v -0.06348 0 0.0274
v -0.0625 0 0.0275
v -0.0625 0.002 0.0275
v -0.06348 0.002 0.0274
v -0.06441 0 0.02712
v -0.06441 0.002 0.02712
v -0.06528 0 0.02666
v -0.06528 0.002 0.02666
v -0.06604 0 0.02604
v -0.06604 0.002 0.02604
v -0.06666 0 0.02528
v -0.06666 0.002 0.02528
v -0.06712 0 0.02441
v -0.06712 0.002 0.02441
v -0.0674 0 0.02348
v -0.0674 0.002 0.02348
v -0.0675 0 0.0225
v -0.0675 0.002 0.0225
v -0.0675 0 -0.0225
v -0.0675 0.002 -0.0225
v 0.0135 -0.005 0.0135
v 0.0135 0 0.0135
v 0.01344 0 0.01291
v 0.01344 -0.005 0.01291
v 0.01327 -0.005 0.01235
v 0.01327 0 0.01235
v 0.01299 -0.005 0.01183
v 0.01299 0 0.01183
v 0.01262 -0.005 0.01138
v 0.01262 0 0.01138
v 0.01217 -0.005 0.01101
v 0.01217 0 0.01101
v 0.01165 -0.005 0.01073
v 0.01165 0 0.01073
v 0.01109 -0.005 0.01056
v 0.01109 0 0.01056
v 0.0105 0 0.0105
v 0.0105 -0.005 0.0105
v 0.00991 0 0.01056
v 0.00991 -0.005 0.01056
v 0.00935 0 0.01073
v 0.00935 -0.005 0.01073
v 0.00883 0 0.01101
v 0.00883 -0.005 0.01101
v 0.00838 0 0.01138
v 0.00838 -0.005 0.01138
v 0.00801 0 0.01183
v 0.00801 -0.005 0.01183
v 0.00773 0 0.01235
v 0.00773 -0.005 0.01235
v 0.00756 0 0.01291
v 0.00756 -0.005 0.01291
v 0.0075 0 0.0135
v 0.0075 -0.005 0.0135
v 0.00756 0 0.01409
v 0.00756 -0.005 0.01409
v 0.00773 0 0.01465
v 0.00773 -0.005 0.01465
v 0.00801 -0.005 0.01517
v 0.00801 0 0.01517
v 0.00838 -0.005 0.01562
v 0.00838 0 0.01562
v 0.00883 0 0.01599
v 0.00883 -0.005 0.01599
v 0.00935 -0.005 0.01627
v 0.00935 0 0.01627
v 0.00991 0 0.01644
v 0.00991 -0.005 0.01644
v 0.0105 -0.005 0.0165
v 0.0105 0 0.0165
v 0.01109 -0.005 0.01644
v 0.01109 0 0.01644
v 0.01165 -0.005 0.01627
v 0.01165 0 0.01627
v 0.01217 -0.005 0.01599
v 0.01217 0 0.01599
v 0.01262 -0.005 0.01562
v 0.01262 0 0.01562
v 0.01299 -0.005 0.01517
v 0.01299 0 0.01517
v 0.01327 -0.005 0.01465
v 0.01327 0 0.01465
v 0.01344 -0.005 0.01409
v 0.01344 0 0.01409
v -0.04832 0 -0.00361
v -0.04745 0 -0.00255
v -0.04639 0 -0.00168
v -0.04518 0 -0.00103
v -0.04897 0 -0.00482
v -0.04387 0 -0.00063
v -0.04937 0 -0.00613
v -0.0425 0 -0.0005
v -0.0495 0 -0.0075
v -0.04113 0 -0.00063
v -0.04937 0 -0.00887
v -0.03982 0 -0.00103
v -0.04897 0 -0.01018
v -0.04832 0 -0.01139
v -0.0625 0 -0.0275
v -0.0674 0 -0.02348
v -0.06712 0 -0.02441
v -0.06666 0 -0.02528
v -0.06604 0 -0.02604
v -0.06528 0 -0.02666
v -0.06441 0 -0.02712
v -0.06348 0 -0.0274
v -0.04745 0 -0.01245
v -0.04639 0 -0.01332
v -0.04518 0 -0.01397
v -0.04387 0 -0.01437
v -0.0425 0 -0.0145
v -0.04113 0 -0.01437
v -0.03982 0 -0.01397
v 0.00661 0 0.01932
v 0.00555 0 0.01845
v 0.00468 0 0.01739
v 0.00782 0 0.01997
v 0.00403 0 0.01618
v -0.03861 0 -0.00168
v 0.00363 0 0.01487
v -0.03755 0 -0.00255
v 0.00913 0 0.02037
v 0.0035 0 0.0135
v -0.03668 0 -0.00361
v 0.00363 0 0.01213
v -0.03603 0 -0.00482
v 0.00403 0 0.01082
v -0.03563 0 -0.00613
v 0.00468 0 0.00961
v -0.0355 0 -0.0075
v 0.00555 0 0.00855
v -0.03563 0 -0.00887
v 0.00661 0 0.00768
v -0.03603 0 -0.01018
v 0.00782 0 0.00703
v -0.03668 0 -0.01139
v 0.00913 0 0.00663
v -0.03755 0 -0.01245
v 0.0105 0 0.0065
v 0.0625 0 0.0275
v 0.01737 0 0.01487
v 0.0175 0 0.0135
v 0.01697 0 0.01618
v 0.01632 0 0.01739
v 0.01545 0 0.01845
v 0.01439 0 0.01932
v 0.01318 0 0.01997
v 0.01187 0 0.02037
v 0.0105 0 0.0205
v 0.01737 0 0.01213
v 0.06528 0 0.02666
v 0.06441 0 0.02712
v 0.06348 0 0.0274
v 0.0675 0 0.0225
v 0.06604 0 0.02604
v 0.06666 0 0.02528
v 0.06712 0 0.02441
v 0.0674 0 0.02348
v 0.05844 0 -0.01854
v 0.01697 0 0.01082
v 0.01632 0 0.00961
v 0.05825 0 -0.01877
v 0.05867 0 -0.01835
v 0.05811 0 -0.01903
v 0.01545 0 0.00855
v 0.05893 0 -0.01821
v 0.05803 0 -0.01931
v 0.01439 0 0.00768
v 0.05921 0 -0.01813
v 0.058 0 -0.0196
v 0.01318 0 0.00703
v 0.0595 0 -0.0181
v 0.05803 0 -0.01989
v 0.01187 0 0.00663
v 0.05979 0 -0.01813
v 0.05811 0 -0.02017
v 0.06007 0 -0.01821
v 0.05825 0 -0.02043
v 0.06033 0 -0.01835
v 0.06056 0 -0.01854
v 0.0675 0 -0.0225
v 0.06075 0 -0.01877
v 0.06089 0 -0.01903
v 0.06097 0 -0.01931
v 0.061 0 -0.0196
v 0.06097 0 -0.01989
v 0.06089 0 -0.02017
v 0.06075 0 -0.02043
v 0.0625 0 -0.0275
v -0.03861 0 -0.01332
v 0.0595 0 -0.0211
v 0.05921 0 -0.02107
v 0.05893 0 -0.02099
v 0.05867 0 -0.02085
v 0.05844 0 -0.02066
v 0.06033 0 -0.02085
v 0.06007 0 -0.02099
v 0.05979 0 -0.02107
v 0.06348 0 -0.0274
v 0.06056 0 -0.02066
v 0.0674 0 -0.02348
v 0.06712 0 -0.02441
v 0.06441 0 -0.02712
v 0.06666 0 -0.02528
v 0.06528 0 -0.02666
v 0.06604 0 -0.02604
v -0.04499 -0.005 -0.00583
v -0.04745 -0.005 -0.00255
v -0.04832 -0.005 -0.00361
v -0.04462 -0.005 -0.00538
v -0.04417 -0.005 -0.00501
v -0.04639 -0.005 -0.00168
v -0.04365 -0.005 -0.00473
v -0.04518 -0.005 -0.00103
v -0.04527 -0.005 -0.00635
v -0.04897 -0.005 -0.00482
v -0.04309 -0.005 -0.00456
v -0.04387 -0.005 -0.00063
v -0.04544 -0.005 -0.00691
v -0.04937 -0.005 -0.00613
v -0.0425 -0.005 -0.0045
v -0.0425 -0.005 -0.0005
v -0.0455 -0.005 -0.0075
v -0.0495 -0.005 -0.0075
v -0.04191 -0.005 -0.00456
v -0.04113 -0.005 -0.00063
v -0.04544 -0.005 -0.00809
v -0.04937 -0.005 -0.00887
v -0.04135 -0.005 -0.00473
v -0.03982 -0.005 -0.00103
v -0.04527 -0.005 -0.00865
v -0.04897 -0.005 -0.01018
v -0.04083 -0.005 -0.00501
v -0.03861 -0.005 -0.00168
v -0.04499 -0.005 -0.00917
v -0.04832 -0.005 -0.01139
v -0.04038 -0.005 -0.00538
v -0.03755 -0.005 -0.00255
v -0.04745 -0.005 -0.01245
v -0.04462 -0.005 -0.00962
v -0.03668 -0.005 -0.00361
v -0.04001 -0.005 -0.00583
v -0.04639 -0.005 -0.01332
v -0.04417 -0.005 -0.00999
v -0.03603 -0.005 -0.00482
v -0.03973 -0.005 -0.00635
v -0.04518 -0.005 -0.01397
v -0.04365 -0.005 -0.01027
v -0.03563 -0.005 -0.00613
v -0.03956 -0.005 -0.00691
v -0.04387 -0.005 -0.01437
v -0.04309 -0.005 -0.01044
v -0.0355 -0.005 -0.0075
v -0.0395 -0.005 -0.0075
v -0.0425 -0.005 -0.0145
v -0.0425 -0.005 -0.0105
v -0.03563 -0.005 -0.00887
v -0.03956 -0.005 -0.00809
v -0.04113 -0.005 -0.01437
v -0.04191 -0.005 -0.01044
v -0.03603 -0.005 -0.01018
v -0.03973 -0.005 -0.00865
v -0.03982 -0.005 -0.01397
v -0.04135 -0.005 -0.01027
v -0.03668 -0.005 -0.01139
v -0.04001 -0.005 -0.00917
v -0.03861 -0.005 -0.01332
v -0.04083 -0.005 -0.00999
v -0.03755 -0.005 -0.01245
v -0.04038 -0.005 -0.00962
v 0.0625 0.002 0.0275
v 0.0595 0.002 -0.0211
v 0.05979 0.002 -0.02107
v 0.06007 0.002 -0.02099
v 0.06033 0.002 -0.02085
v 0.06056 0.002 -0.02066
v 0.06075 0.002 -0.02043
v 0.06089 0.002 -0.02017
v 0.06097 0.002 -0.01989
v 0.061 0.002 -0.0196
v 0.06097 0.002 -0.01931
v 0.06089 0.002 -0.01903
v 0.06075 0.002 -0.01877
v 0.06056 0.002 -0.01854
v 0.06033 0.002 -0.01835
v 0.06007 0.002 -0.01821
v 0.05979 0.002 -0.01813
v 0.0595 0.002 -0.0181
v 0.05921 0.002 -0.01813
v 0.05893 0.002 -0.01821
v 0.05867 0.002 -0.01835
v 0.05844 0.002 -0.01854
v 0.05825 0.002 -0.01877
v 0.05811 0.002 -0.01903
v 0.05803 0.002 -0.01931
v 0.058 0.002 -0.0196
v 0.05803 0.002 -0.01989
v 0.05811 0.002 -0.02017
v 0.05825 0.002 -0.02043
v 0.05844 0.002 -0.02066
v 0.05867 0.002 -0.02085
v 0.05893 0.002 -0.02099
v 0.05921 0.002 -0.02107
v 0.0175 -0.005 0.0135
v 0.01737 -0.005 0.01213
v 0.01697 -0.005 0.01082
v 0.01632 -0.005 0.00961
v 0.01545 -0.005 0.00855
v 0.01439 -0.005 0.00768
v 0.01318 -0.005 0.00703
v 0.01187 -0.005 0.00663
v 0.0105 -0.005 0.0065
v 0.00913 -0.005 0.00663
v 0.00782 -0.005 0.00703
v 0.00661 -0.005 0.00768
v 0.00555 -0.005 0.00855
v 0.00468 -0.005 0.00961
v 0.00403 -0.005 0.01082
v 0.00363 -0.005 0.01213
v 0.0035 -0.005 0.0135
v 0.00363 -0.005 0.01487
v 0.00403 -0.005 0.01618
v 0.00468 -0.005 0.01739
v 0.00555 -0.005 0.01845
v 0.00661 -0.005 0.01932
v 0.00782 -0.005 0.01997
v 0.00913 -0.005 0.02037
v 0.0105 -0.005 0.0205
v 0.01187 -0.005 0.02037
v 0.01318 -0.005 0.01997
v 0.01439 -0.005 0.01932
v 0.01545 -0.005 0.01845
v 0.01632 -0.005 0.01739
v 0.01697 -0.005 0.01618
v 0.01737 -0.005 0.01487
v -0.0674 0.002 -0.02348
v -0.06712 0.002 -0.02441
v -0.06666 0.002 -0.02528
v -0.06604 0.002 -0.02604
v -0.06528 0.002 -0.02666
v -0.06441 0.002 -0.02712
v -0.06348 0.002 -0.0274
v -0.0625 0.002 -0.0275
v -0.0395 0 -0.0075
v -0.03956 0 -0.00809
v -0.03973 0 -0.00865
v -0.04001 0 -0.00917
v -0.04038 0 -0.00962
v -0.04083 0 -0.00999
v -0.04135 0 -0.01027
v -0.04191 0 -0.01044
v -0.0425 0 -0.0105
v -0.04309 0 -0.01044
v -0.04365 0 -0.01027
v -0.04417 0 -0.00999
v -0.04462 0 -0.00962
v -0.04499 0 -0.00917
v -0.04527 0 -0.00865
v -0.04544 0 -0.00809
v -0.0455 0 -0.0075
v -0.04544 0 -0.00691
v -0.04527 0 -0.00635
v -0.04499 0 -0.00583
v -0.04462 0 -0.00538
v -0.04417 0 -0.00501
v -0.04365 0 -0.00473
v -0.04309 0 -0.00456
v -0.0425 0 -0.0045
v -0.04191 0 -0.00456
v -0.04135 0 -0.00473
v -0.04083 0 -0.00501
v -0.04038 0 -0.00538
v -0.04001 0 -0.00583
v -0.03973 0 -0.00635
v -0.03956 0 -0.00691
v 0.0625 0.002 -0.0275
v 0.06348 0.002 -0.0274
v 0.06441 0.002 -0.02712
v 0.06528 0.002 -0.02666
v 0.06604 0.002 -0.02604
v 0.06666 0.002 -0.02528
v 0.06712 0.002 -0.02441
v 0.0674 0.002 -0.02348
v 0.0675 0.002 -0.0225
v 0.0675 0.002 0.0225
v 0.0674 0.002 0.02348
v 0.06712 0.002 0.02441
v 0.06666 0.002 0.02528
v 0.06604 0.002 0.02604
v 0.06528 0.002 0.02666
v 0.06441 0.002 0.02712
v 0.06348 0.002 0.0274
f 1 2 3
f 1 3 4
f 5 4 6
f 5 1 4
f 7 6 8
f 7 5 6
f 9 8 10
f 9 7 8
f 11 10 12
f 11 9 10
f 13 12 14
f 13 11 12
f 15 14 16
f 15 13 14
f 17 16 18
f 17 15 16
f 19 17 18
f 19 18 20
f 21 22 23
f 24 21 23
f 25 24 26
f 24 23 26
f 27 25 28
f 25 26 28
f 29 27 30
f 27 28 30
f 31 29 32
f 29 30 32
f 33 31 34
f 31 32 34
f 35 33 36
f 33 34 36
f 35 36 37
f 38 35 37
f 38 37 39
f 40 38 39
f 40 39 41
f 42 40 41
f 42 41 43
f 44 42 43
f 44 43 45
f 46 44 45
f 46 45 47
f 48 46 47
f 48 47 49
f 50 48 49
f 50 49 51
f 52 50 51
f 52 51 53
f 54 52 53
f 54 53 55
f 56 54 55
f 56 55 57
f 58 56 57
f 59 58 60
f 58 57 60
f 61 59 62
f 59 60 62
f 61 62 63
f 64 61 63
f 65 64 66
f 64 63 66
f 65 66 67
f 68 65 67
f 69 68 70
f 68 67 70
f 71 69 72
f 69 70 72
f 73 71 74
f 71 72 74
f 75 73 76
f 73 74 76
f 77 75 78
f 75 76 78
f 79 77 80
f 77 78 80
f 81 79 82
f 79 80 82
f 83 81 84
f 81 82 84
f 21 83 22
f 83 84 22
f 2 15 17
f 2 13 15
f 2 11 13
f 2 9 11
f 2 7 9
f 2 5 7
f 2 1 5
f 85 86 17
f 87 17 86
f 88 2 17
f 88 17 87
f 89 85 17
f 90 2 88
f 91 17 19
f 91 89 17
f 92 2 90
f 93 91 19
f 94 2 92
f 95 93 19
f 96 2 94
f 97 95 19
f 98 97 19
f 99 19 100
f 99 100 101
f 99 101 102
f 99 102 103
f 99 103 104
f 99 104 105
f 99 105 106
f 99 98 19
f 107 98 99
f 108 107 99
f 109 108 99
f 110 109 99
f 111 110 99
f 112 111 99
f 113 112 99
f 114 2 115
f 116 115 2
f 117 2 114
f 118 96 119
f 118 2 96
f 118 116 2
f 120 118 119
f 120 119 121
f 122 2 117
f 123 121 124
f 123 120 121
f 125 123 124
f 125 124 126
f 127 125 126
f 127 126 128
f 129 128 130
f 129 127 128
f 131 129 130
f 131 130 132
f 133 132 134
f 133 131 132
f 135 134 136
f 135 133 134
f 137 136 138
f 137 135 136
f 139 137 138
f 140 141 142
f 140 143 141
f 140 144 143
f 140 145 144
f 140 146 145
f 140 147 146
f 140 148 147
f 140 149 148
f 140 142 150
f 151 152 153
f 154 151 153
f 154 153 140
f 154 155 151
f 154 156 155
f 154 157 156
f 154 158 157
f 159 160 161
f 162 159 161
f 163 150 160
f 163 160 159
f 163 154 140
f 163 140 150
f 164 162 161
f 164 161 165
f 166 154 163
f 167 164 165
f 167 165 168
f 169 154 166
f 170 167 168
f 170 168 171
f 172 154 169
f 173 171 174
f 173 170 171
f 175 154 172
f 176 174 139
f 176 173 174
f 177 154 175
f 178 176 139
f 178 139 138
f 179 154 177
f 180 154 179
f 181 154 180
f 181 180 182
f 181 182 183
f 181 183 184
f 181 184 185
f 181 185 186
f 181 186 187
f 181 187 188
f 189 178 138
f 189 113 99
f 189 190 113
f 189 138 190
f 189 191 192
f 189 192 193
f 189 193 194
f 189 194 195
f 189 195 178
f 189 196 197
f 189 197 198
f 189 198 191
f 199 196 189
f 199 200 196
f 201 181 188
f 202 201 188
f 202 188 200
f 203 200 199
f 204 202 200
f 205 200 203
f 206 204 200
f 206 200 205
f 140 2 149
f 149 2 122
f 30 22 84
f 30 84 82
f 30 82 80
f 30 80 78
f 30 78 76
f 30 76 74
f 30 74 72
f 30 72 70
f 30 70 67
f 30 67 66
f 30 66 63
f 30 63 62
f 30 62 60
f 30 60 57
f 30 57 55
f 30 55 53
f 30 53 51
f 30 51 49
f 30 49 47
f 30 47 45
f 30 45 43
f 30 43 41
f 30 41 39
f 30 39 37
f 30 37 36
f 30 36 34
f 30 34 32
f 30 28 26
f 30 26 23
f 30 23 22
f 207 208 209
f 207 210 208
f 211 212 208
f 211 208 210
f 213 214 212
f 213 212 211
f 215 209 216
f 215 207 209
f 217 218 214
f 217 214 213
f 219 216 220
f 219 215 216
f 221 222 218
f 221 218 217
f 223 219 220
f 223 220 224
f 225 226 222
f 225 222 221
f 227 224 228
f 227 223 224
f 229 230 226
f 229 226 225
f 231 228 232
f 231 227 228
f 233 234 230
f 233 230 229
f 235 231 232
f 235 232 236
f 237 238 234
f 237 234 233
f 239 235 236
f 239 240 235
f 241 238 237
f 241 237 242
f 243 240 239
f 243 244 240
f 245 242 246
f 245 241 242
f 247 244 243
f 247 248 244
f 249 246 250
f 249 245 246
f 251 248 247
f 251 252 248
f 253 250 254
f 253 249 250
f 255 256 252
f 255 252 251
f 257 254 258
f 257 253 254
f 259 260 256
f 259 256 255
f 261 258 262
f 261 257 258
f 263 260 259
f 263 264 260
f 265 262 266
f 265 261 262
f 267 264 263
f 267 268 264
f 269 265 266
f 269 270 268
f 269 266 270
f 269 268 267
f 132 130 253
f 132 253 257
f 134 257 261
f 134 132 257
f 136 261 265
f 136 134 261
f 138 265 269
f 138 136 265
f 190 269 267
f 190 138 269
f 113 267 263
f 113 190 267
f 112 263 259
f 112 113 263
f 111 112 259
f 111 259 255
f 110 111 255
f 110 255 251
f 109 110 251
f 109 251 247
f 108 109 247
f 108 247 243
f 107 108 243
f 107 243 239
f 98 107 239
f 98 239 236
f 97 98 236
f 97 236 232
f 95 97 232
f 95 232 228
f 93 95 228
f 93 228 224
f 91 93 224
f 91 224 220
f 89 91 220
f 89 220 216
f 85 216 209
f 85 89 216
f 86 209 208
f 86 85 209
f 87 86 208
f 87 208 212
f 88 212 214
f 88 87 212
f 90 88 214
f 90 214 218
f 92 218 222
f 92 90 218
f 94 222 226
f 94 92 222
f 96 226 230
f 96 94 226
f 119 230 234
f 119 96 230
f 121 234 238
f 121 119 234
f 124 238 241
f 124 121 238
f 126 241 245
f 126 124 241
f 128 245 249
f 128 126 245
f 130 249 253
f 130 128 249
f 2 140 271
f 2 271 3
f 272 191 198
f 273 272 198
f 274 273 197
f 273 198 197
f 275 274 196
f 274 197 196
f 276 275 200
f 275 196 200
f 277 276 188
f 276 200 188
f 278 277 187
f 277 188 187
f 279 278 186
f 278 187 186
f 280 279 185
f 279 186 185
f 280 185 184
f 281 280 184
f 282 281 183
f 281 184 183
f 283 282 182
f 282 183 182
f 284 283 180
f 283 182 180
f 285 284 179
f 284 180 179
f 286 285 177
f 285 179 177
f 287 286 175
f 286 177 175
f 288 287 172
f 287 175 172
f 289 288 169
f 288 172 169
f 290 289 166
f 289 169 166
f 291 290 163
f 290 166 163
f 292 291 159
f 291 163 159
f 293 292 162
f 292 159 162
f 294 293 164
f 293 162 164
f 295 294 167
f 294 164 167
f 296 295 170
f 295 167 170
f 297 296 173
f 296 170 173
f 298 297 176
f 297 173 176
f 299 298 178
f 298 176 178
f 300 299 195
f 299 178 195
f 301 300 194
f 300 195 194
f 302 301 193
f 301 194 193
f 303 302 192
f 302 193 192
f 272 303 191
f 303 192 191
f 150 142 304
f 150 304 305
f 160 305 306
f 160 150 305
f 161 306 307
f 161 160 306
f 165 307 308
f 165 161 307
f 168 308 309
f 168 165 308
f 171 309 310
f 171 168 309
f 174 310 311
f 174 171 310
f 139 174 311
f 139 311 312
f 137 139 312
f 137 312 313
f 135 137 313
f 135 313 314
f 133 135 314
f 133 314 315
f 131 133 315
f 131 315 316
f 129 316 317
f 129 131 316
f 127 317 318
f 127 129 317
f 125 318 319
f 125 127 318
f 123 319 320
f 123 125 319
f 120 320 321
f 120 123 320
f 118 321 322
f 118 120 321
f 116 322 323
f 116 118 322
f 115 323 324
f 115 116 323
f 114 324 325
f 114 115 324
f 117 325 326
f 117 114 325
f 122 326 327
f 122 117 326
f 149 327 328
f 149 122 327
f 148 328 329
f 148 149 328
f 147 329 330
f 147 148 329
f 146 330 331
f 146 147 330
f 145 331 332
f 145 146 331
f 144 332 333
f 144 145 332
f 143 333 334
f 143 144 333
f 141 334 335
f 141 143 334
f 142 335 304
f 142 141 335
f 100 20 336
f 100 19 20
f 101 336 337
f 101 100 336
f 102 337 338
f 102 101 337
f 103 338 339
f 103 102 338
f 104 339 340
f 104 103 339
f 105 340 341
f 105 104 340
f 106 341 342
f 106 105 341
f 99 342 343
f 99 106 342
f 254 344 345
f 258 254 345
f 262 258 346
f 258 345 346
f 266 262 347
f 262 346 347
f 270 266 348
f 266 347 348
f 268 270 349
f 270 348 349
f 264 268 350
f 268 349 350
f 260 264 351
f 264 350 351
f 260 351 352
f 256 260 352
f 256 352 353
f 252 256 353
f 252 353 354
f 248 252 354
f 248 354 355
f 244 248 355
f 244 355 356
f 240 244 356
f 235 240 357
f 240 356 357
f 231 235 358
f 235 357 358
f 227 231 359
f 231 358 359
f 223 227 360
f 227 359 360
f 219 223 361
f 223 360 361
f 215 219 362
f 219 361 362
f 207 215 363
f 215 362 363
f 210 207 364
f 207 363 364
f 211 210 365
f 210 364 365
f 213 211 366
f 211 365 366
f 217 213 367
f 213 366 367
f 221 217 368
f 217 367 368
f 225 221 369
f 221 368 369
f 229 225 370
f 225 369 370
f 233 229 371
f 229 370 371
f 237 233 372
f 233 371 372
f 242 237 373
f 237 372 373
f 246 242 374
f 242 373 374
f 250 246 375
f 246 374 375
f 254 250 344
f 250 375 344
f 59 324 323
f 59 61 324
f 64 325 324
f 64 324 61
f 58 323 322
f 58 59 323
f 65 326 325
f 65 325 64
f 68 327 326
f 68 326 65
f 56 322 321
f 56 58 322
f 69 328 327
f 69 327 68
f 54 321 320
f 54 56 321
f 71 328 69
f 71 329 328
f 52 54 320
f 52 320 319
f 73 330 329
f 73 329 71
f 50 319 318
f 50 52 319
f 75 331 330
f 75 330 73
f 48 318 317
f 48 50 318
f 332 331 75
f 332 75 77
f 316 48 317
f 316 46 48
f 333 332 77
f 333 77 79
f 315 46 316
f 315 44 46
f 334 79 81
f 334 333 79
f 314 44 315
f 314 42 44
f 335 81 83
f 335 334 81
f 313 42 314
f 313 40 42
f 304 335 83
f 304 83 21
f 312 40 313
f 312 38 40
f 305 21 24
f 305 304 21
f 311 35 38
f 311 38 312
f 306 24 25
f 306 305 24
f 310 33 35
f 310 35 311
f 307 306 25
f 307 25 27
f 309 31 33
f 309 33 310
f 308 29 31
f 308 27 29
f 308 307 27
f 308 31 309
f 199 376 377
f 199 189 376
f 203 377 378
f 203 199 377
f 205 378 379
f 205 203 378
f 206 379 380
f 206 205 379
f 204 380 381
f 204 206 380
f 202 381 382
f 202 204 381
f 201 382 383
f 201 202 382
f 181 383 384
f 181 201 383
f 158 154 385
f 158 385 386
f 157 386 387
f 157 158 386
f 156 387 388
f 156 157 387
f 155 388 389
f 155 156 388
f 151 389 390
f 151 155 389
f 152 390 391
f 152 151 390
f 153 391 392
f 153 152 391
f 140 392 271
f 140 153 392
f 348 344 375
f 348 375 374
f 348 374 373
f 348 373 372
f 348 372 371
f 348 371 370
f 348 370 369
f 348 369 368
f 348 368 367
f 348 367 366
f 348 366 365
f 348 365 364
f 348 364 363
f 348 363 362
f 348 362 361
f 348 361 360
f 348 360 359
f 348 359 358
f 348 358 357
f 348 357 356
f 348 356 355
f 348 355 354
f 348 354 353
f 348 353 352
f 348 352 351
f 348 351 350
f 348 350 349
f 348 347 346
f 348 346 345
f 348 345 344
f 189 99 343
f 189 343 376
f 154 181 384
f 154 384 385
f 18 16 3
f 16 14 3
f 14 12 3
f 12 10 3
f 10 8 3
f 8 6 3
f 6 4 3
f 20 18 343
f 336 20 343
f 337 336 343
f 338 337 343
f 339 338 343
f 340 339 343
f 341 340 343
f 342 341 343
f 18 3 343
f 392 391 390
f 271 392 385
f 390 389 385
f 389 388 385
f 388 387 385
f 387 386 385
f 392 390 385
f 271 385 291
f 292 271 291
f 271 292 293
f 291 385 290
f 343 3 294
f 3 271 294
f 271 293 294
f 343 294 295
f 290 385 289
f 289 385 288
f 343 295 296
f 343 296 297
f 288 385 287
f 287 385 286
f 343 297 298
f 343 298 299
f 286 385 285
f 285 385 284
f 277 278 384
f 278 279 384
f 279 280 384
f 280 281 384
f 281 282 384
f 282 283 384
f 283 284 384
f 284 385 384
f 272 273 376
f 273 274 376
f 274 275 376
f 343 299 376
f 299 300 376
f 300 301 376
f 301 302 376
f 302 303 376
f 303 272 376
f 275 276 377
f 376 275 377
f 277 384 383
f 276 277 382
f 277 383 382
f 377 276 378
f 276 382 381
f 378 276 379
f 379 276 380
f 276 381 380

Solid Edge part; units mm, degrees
sketch "Sketch1" plane through (0, 0, 0) normal (0, -1, 0) x (1, 0, 0)
  line L0 (-0.0625, -0.0275) -> (0.0625, -0.0275)
  arc A0 (0.0675, -0.0225) -> (0.0625, -0.0275) centre (0.0625, -0.0225) cw
  line L1 (0.0675, -0.0225) -> (0.0675, 0.0225)
  arc A1 (0.0625, 0.0275) -> (0.0675, 0.0225) centre (0.0625, 0.0225) cw
  line L2 (0.0625, 0.0275) -> (-0.0625, 0.0275)
  arc A2 (-0.0675, 0.0225) -> (-0.0625, 0.0275) centre (-0.0625, 0.0225) cw
  line L3 (-0.0675, 0.0225) -> (-0.0675, -0.0225)
  arc A3 (-0.0675, -0.0225) -> (-0.0625, -0.0275) centre (-0.0625, -0.0225) ccw
  dimension "D1" = 0.135
  dimension "D2" = 0.055
extrude "Protrusion1" add sketch "Sketch1" against normal blind 0.002
sketch "Sketch2" plane through (0, 0, 0) normal (0, -1, 0) x (1, 0, 0)
  circle A0 centre (0.0105, 0.0135) radius 0.007
  circle A1 centre (-0.0425, -0.0075) radius 0.003
  circle A2 centre (0.0105, 0.0135) radius 0.003
  circle A3 centre (-0.0425, -0.0075) radius 0.007
  dimension "D1" = 0.078
  dimension "D2" = 0.025
  dimension "D3" = 0.014
  dimension "D4" = 0.006
  dimension "D5" = 0.041
  dimension "D6" = 0.02
extrude "Ausprägung_2" add sketch "Sketch2" along normal blind 0.005
hole "Bohrung_1" at (0.0595, 0, -0.0196) direction (0, 1, 0) diameter 0.003 end up to next
